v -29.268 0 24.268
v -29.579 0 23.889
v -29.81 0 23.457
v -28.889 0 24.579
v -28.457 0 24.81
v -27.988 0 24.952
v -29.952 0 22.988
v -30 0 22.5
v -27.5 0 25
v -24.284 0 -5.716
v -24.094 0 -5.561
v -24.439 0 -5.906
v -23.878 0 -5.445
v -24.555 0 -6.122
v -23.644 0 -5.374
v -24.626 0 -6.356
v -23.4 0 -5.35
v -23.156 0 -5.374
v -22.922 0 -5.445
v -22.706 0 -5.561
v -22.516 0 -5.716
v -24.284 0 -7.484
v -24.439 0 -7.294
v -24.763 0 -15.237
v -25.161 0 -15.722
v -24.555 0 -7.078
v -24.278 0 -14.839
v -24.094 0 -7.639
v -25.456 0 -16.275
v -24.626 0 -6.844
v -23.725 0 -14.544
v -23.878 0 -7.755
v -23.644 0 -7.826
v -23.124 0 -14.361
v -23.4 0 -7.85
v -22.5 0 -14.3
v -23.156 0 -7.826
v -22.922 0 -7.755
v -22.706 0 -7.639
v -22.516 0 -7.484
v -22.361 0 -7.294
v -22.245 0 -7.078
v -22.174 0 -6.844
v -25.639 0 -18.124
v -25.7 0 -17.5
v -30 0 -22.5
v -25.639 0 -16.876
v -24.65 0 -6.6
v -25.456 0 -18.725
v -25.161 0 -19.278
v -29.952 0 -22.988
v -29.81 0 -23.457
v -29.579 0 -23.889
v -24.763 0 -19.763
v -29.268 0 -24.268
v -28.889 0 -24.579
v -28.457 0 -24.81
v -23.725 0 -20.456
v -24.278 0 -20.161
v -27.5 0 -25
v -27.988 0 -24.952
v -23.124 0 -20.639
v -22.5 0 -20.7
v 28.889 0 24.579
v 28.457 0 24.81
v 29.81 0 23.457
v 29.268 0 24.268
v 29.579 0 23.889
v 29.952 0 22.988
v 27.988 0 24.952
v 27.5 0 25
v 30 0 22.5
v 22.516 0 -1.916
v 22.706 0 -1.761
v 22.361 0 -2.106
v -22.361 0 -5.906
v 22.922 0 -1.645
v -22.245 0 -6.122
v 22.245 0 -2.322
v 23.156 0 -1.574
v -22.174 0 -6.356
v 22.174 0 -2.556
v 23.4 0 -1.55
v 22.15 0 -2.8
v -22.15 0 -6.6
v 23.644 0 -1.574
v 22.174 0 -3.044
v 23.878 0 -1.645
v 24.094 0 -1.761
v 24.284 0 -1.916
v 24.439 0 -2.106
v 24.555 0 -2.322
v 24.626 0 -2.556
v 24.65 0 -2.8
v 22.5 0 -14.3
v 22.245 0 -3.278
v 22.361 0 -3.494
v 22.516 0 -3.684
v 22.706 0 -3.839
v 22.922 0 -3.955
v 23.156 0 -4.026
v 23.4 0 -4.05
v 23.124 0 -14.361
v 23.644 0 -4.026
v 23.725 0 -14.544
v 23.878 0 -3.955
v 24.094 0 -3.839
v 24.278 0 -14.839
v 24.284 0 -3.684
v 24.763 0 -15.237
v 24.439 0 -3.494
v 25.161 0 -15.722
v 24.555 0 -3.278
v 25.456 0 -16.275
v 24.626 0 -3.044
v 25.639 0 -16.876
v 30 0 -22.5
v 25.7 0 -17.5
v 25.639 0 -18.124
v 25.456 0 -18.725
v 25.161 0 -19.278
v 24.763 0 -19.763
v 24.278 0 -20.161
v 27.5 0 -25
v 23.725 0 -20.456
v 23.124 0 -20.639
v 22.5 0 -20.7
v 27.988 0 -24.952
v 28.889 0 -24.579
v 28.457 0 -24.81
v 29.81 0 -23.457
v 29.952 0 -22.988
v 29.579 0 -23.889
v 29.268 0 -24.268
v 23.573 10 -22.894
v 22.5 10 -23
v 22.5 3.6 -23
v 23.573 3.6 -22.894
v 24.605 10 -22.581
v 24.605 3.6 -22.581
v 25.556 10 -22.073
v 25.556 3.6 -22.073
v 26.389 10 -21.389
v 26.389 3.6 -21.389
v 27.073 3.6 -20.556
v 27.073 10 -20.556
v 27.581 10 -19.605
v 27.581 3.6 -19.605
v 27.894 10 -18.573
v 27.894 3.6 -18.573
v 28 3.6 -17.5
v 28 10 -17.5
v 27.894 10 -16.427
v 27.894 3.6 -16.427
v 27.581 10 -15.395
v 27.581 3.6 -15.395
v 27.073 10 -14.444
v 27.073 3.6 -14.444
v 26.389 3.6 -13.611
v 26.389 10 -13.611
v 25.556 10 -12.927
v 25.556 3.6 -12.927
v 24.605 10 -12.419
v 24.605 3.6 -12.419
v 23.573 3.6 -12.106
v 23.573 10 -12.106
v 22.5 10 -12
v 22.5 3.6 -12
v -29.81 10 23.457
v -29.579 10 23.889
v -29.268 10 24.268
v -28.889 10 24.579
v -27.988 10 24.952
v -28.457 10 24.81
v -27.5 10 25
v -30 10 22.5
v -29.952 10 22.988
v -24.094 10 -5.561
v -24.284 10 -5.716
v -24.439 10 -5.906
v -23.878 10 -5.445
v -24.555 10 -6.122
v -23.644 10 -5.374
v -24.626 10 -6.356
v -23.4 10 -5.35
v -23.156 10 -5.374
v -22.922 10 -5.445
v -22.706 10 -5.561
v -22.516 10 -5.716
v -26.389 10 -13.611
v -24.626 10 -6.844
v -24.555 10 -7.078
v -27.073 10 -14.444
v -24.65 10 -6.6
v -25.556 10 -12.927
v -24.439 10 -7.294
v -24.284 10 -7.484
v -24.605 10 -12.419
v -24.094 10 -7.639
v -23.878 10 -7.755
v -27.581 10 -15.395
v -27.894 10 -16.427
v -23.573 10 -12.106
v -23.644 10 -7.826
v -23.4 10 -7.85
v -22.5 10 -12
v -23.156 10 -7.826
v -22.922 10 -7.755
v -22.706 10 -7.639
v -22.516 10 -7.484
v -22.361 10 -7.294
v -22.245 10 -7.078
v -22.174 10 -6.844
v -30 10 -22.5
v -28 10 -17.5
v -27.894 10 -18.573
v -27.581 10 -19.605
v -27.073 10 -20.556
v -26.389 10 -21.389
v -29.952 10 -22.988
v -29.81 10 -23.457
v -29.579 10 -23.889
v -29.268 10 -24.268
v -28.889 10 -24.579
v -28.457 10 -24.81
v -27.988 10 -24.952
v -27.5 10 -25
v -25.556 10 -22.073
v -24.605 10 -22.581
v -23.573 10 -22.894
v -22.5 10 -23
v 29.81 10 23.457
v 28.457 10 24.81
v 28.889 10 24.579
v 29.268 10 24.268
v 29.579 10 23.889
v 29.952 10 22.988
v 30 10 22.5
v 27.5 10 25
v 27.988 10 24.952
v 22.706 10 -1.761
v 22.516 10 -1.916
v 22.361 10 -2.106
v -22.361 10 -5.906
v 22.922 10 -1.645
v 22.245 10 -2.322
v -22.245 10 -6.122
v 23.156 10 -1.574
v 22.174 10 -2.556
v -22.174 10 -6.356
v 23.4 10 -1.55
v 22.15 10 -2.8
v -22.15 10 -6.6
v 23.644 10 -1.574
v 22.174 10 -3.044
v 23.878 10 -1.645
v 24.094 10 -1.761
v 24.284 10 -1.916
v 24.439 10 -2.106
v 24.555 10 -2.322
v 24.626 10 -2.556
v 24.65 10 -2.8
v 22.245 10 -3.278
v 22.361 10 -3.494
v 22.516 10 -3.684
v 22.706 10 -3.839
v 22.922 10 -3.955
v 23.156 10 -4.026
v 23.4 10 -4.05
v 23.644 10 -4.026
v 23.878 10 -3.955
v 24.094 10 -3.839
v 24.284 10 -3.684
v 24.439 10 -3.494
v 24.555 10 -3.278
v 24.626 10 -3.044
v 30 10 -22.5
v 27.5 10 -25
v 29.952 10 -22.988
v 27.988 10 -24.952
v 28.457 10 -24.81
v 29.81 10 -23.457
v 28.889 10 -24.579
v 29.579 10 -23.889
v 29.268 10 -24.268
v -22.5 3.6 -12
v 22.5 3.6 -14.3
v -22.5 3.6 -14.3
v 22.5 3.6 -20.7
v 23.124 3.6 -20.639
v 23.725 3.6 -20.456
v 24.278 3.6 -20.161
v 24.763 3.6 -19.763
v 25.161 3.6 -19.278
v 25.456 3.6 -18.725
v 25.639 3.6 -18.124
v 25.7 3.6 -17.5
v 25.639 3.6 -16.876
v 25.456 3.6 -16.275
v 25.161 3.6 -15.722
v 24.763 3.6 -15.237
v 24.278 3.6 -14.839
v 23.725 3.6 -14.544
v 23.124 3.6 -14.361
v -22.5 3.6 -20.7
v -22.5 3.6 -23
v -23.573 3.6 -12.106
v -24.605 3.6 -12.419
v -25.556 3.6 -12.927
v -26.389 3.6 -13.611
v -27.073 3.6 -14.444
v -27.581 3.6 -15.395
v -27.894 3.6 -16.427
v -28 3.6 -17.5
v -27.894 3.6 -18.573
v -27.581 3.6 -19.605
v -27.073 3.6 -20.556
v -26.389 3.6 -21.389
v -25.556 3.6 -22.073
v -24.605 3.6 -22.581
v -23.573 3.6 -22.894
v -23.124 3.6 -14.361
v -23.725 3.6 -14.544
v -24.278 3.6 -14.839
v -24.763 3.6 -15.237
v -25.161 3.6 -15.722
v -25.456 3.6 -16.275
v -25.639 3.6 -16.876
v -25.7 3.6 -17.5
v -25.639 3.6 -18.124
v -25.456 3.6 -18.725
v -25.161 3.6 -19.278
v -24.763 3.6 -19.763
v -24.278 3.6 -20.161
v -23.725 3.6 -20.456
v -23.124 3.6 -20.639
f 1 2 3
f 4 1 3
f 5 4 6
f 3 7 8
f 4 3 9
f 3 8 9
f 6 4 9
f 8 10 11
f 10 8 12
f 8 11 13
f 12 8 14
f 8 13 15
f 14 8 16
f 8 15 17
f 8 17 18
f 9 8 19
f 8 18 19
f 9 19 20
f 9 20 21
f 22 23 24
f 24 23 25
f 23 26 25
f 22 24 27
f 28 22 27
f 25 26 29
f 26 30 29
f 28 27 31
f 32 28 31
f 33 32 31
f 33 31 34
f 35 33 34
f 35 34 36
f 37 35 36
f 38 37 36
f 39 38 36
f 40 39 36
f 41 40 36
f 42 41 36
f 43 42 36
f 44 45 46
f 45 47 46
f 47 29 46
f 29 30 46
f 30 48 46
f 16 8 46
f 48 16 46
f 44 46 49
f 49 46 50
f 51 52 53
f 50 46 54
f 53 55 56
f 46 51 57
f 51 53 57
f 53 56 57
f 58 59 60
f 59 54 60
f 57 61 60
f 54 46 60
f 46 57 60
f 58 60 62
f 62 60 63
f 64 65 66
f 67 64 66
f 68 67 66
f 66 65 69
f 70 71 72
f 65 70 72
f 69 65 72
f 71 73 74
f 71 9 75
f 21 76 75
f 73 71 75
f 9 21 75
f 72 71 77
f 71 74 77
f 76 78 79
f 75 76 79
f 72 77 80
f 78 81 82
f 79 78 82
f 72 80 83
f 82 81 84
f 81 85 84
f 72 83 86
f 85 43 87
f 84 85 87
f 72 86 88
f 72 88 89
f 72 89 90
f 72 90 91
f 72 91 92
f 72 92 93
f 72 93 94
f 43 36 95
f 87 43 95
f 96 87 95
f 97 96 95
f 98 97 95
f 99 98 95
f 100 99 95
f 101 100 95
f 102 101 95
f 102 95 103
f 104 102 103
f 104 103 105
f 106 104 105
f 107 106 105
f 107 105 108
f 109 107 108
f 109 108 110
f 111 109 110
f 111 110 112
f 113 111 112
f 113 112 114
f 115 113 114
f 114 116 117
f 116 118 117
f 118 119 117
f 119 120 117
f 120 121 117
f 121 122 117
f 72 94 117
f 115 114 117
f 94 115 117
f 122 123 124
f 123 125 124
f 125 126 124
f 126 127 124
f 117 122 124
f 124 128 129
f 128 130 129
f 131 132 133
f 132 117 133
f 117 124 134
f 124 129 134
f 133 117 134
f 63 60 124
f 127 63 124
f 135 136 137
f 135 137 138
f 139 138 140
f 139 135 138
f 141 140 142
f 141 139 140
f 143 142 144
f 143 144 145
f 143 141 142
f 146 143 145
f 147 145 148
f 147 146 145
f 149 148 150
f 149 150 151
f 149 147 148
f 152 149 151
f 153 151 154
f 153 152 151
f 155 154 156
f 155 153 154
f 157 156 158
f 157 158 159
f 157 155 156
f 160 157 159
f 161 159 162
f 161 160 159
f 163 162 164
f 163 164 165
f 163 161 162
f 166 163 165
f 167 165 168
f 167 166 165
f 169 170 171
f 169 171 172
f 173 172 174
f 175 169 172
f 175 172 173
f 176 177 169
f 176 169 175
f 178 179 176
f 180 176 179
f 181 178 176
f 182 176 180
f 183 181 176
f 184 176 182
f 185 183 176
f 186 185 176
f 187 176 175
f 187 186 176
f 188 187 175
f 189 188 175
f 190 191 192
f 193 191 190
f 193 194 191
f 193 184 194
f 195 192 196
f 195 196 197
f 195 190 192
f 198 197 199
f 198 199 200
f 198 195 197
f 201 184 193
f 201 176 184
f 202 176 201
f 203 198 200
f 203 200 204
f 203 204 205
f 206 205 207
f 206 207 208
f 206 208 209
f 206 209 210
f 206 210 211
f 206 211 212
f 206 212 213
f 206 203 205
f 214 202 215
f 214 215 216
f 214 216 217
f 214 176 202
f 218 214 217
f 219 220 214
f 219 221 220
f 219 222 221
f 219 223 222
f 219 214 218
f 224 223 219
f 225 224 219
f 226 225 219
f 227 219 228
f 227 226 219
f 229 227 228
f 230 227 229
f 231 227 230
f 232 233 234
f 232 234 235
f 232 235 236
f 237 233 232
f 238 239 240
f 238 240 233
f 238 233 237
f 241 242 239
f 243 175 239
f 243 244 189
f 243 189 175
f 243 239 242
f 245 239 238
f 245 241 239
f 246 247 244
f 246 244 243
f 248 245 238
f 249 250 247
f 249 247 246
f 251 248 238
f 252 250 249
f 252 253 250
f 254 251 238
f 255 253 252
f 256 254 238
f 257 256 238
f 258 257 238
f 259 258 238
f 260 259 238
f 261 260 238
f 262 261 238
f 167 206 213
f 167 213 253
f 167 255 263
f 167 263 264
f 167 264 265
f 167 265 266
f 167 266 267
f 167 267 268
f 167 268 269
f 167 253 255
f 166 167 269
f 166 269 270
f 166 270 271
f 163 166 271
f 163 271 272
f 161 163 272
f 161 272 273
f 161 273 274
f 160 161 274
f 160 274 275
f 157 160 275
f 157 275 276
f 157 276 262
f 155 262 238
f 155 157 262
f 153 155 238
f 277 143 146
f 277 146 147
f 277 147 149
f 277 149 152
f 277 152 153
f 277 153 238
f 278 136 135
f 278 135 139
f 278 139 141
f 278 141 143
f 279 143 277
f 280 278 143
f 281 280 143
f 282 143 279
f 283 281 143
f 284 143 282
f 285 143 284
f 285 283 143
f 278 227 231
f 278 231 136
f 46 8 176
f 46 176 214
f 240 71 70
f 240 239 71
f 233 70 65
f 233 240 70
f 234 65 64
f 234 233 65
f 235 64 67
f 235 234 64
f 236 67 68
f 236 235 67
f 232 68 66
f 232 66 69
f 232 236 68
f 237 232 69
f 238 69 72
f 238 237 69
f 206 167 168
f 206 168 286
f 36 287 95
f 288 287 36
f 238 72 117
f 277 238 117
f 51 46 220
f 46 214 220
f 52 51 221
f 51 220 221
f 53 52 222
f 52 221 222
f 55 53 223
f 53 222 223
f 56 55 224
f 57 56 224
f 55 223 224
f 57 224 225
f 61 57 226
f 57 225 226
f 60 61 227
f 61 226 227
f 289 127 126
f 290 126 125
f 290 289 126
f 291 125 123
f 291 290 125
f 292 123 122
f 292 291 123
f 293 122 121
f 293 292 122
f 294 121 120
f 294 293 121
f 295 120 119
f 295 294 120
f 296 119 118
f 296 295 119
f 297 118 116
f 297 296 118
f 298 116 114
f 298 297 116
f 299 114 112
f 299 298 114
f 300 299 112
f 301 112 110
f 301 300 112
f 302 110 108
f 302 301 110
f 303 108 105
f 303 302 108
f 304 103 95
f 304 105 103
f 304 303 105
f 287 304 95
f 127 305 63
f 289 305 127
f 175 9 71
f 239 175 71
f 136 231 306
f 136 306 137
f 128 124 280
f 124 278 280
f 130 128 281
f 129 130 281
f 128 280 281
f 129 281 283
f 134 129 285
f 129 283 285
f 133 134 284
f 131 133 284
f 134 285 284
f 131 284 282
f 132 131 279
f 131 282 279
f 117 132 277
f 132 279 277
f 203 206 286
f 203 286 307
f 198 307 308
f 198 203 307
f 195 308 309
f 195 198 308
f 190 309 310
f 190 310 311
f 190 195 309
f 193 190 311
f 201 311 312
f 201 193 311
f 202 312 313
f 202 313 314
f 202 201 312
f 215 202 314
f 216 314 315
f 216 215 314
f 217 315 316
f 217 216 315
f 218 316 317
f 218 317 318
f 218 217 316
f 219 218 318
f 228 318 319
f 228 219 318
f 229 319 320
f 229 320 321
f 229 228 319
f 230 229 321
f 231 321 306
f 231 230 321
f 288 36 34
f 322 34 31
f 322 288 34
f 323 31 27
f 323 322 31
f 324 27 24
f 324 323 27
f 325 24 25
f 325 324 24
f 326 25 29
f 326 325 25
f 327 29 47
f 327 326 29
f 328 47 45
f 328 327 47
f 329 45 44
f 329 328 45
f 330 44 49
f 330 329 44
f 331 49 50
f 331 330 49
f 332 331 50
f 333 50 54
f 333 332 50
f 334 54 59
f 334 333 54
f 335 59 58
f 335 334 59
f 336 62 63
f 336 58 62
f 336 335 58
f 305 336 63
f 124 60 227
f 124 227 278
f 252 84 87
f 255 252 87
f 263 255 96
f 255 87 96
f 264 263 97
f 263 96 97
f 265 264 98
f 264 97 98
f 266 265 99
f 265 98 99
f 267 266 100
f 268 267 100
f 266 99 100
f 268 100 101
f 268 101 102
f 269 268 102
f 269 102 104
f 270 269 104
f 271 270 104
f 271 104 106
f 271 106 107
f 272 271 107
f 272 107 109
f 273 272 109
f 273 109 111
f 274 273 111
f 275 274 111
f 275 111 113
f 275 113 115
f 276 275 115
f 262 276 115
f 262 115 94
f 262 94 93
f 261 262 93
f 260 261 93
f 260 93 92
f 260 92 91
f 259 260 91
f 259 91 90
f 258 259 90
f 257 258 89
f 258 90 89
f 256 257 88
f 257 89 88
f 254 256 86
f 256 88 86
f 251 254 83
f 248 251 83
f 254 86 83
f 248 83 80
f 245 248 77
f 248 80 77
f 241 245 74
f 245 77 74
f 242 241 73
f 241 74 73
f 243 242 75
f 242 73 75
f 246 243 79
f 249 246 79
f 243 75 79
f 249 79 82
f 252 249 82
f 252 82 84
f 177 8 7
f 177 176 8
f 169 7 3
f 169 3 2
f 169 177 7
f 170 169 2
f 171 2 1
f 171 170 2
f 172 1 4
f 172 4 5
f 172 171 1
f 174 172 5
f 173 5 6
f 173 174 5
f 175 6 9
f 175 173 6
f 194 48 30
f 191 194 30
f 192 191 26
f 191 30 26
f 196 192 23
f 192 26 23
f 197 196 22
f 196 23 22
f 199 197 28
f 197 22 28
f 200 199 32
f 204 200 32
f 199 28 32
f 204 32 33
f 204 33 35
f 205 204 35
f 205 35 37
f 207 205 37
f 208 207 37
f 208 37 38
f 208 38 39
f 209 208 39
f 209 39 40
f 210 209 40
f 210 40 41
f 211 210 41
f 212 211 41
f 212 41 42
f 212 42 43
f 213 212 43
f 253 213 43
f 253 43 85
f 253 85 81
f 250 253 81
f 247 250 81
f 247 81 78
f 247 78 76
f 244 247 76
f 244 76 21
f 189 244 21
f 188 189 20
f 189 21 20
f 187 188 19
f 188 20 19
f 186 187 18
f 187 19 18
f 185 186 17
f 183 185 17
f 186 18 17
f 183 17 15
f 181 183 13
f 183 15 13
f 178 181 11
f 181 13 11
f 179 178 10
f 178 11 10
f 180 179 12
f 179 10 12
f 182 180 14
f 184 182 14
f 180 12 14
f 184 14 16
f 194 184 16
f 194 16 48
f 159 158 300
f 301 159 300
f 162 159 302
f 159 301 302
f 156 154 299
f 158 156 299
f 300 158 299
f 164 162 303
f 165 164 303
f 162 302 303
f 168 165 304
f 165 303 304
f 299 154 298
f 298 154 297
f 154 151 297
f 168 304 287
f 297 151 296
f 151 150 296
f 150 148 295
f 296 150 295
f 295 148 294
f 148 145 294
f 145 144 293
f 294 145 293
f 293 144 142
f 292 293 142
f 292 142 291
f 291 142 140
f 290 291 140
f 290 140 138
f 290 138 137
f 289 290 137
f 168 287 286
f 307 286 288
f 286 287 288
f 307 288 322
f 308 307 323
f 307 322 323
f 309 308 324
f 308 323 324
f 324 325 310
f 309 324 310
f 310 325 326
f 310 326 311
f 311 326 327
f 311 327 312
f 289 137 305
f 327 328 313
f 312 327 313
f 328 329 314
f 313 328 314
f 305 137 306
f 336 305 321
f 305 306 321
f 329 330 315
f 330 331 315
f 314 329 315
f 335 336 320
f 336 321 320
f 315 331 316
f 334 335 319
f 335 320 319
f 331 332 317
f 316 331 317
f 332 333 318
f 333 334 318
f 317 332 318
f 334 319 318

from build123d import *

# Parameters (mm, degrees)
SKETCH1_W             = 60
SKETCH1_H             = 50
BOSS_EXTRUDE1_DEPTH   = 10
M3_TAPPED_HOLE1_D     = 2.5
M3_TAPPED_HOLE1_DEPTH = 10
CUT_EXTRUDE1_DEPTH    = 6.4
CUT_EXTRUDE2_DEPTH    = 4.6
FILLET1_R             = 2.5


with BuildPart() as part:
    # Sketch1 → Boss-Extrude1 (new body)
    with BuildSketch(Plane(origin=(0, 0, 0), x_dir=(1, 0, 0), z_dir=(0, 1, 0))):
        Rectangle(SKETCH1_W, SKETCH1_H)
    extrude(amount=BOSS_EXTRUDE1_DEPTH)

    # M3 Tapped Hole1
    with Locations(Plane(origin=(0, 10, 0), x_dir=(1, 0, 0), z_dir=(0, 1, 0))):
        with Locations((-23.4, 6.6), (23.4, 2.8)):
            Hole(M3_TAPPED_HOLE1_D / 2, depth=M3_TAPPED_HOLE1_DEPTH)

    # Sketch7 → Cut-Extrude1 (cut)
    with BuildSketch(Plane(origin=(0, 10, 0), x_dir=(1, 0, 0), z_dir=(0, 1, 0))):
        with BuildLine():
            Line((-22.5, 23), (22.5, 23))
            ThreePointArc((22.5, 23), (28, 17.5), (22.5, 12))
            Line((22.5, 12), (-22.5, 12))
            ThreePointArc((-22.5, 12), (-28, 17.5), (-22.5, 23))
        make_face()
    extrude(amount=-CUT_EXTRUDE1_DEPTH, mode=Mode.SUBTRACT)

    # Sketch8 → Cut-Extrude2 (cut, through all)
    with BuildSketch(Plane(origin=(0, 3.6, 0), x_dir=(1, 0, 0), z_dir=(0, 1, 0))):
        with BuildLine():
            Line((-22.5, 20.7), (22.5, 20.7))
            ThreePointArc((22.5, 20.7), (25.7, 17.5), (22.5, 14.3))
            Line((22.5, 14.3), (-22.5, 14.3))
            ThreePointArc((-22.5, 14.3), (-25.7, 17.5), (-22.5, 20.7))
        make_face()
    extrude(amount=-CUT_EXTRUDE2_DEPTH, mode=Mode.SUBTRACT)

    # Fillet1
    fillet1_edges = [part.edges().sort_by_distance(p)[0] for p in [
        (30, 5, 25),
        (-30, 5, 25),
        (-30, 5, -25),
        (30, 5, -25),
    ]]
    fillet(fillet1_edges, radius=FILLET1_R)


solid = part.part
